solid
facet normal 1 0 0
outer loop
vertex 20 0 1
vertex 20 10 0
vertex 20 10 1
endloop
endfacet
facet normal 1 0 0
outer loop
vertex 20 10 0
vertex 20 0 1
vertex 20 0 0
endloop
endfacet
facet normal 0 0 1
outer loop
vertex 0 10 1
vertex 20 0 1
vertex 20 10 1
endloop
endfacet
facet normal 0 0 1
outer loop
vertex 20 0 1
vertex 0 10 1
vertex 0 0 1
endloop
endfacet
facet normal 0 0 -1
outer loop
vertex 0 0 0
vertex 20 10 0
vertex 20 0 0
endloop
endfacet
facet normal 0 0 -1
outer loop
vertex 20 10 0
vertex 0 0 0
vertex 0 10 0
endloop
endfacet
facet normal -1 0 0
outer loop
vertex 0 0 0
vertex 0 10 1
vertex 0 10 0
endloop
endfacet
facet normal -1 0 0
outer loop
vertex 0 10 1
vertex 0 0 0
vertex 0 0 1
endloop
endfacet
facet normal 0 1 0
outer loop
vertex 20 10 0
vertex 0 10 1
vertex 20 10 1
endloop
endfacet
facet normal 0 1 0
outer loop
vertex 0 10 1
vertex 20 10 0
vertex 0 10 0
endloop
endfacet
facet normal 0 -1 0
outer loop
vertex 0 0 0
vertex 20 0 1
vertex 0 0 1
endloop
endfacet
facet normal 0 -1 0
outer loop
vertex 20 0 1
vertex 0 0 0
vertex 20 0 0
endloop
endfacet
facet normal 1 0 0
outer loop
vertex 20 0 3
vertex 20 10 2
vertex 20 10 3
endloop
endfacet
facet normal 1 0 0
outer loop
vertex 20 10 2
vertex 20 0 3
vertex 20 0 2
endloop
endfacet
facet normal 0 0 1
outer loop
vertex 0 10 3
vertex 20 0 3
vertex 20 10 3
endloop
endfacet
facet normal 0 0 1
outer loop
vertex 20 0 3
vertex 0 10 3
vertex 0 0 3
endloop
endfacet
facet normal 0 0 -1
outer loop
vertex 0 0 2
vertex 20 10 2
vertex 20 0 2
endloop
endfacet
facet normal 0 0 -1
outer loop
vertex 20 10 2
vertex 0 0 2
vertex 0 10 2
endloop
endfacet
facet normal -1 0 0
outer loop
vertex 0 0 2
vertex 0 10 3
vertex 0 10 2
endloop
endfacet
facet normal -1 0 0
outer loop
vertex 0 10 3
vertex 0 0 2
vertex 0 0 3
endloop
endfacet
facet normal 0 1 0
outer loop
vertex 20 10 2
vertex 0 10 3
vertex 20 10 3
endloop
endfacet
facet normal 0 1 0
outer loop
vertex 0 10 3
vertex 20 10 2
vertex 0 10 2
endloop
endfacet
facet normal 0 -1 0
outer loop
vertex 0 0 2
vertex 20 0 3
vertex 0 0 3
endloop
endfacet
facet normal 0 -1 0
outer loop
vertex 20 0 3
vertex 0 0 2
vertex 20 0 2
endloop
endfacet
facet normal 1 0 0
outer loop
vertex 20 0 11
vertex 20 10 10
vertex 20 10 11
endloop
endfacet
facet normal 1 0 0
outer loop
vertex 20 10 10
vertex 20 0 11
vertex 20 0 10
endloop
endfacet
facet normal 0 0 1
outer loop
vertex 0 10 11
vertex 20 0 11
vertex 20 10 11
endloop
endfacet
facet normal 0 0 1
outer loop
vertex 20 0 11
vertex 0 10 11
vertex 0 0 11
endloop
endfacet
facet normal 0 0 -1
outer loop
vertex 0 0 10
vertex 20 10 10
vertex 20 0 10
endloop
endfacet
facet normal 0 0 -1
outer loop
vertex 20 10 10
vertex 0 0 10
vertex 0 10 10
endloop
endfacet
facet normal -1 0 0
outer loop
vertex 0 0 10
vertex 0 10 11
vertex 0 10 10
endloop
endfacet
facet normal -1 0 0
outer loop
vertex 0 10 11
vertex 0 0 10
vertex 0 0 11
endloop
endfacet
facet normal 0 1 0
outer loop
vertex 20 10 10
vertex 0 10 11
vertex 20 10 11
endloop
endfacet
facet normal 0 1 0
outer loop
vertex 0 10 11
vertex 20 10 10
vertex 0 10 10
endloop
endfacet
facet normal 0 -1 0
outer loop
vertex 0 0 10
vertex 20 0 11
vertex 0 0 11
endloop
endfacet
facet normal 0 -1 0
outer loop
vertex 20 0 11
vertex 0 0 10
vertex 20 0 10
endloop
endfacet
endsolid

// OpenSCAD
module base(x,y,h, pos) {
       translate([0,0,pos])
          cube([x,y,h], 0);
}

module case_a(){
    x=20;
    y=10;
    h=1;

    base (x,y,h,0);
    base (x,y,h,2);
    base (x,y,h,10);
}

case_a();
